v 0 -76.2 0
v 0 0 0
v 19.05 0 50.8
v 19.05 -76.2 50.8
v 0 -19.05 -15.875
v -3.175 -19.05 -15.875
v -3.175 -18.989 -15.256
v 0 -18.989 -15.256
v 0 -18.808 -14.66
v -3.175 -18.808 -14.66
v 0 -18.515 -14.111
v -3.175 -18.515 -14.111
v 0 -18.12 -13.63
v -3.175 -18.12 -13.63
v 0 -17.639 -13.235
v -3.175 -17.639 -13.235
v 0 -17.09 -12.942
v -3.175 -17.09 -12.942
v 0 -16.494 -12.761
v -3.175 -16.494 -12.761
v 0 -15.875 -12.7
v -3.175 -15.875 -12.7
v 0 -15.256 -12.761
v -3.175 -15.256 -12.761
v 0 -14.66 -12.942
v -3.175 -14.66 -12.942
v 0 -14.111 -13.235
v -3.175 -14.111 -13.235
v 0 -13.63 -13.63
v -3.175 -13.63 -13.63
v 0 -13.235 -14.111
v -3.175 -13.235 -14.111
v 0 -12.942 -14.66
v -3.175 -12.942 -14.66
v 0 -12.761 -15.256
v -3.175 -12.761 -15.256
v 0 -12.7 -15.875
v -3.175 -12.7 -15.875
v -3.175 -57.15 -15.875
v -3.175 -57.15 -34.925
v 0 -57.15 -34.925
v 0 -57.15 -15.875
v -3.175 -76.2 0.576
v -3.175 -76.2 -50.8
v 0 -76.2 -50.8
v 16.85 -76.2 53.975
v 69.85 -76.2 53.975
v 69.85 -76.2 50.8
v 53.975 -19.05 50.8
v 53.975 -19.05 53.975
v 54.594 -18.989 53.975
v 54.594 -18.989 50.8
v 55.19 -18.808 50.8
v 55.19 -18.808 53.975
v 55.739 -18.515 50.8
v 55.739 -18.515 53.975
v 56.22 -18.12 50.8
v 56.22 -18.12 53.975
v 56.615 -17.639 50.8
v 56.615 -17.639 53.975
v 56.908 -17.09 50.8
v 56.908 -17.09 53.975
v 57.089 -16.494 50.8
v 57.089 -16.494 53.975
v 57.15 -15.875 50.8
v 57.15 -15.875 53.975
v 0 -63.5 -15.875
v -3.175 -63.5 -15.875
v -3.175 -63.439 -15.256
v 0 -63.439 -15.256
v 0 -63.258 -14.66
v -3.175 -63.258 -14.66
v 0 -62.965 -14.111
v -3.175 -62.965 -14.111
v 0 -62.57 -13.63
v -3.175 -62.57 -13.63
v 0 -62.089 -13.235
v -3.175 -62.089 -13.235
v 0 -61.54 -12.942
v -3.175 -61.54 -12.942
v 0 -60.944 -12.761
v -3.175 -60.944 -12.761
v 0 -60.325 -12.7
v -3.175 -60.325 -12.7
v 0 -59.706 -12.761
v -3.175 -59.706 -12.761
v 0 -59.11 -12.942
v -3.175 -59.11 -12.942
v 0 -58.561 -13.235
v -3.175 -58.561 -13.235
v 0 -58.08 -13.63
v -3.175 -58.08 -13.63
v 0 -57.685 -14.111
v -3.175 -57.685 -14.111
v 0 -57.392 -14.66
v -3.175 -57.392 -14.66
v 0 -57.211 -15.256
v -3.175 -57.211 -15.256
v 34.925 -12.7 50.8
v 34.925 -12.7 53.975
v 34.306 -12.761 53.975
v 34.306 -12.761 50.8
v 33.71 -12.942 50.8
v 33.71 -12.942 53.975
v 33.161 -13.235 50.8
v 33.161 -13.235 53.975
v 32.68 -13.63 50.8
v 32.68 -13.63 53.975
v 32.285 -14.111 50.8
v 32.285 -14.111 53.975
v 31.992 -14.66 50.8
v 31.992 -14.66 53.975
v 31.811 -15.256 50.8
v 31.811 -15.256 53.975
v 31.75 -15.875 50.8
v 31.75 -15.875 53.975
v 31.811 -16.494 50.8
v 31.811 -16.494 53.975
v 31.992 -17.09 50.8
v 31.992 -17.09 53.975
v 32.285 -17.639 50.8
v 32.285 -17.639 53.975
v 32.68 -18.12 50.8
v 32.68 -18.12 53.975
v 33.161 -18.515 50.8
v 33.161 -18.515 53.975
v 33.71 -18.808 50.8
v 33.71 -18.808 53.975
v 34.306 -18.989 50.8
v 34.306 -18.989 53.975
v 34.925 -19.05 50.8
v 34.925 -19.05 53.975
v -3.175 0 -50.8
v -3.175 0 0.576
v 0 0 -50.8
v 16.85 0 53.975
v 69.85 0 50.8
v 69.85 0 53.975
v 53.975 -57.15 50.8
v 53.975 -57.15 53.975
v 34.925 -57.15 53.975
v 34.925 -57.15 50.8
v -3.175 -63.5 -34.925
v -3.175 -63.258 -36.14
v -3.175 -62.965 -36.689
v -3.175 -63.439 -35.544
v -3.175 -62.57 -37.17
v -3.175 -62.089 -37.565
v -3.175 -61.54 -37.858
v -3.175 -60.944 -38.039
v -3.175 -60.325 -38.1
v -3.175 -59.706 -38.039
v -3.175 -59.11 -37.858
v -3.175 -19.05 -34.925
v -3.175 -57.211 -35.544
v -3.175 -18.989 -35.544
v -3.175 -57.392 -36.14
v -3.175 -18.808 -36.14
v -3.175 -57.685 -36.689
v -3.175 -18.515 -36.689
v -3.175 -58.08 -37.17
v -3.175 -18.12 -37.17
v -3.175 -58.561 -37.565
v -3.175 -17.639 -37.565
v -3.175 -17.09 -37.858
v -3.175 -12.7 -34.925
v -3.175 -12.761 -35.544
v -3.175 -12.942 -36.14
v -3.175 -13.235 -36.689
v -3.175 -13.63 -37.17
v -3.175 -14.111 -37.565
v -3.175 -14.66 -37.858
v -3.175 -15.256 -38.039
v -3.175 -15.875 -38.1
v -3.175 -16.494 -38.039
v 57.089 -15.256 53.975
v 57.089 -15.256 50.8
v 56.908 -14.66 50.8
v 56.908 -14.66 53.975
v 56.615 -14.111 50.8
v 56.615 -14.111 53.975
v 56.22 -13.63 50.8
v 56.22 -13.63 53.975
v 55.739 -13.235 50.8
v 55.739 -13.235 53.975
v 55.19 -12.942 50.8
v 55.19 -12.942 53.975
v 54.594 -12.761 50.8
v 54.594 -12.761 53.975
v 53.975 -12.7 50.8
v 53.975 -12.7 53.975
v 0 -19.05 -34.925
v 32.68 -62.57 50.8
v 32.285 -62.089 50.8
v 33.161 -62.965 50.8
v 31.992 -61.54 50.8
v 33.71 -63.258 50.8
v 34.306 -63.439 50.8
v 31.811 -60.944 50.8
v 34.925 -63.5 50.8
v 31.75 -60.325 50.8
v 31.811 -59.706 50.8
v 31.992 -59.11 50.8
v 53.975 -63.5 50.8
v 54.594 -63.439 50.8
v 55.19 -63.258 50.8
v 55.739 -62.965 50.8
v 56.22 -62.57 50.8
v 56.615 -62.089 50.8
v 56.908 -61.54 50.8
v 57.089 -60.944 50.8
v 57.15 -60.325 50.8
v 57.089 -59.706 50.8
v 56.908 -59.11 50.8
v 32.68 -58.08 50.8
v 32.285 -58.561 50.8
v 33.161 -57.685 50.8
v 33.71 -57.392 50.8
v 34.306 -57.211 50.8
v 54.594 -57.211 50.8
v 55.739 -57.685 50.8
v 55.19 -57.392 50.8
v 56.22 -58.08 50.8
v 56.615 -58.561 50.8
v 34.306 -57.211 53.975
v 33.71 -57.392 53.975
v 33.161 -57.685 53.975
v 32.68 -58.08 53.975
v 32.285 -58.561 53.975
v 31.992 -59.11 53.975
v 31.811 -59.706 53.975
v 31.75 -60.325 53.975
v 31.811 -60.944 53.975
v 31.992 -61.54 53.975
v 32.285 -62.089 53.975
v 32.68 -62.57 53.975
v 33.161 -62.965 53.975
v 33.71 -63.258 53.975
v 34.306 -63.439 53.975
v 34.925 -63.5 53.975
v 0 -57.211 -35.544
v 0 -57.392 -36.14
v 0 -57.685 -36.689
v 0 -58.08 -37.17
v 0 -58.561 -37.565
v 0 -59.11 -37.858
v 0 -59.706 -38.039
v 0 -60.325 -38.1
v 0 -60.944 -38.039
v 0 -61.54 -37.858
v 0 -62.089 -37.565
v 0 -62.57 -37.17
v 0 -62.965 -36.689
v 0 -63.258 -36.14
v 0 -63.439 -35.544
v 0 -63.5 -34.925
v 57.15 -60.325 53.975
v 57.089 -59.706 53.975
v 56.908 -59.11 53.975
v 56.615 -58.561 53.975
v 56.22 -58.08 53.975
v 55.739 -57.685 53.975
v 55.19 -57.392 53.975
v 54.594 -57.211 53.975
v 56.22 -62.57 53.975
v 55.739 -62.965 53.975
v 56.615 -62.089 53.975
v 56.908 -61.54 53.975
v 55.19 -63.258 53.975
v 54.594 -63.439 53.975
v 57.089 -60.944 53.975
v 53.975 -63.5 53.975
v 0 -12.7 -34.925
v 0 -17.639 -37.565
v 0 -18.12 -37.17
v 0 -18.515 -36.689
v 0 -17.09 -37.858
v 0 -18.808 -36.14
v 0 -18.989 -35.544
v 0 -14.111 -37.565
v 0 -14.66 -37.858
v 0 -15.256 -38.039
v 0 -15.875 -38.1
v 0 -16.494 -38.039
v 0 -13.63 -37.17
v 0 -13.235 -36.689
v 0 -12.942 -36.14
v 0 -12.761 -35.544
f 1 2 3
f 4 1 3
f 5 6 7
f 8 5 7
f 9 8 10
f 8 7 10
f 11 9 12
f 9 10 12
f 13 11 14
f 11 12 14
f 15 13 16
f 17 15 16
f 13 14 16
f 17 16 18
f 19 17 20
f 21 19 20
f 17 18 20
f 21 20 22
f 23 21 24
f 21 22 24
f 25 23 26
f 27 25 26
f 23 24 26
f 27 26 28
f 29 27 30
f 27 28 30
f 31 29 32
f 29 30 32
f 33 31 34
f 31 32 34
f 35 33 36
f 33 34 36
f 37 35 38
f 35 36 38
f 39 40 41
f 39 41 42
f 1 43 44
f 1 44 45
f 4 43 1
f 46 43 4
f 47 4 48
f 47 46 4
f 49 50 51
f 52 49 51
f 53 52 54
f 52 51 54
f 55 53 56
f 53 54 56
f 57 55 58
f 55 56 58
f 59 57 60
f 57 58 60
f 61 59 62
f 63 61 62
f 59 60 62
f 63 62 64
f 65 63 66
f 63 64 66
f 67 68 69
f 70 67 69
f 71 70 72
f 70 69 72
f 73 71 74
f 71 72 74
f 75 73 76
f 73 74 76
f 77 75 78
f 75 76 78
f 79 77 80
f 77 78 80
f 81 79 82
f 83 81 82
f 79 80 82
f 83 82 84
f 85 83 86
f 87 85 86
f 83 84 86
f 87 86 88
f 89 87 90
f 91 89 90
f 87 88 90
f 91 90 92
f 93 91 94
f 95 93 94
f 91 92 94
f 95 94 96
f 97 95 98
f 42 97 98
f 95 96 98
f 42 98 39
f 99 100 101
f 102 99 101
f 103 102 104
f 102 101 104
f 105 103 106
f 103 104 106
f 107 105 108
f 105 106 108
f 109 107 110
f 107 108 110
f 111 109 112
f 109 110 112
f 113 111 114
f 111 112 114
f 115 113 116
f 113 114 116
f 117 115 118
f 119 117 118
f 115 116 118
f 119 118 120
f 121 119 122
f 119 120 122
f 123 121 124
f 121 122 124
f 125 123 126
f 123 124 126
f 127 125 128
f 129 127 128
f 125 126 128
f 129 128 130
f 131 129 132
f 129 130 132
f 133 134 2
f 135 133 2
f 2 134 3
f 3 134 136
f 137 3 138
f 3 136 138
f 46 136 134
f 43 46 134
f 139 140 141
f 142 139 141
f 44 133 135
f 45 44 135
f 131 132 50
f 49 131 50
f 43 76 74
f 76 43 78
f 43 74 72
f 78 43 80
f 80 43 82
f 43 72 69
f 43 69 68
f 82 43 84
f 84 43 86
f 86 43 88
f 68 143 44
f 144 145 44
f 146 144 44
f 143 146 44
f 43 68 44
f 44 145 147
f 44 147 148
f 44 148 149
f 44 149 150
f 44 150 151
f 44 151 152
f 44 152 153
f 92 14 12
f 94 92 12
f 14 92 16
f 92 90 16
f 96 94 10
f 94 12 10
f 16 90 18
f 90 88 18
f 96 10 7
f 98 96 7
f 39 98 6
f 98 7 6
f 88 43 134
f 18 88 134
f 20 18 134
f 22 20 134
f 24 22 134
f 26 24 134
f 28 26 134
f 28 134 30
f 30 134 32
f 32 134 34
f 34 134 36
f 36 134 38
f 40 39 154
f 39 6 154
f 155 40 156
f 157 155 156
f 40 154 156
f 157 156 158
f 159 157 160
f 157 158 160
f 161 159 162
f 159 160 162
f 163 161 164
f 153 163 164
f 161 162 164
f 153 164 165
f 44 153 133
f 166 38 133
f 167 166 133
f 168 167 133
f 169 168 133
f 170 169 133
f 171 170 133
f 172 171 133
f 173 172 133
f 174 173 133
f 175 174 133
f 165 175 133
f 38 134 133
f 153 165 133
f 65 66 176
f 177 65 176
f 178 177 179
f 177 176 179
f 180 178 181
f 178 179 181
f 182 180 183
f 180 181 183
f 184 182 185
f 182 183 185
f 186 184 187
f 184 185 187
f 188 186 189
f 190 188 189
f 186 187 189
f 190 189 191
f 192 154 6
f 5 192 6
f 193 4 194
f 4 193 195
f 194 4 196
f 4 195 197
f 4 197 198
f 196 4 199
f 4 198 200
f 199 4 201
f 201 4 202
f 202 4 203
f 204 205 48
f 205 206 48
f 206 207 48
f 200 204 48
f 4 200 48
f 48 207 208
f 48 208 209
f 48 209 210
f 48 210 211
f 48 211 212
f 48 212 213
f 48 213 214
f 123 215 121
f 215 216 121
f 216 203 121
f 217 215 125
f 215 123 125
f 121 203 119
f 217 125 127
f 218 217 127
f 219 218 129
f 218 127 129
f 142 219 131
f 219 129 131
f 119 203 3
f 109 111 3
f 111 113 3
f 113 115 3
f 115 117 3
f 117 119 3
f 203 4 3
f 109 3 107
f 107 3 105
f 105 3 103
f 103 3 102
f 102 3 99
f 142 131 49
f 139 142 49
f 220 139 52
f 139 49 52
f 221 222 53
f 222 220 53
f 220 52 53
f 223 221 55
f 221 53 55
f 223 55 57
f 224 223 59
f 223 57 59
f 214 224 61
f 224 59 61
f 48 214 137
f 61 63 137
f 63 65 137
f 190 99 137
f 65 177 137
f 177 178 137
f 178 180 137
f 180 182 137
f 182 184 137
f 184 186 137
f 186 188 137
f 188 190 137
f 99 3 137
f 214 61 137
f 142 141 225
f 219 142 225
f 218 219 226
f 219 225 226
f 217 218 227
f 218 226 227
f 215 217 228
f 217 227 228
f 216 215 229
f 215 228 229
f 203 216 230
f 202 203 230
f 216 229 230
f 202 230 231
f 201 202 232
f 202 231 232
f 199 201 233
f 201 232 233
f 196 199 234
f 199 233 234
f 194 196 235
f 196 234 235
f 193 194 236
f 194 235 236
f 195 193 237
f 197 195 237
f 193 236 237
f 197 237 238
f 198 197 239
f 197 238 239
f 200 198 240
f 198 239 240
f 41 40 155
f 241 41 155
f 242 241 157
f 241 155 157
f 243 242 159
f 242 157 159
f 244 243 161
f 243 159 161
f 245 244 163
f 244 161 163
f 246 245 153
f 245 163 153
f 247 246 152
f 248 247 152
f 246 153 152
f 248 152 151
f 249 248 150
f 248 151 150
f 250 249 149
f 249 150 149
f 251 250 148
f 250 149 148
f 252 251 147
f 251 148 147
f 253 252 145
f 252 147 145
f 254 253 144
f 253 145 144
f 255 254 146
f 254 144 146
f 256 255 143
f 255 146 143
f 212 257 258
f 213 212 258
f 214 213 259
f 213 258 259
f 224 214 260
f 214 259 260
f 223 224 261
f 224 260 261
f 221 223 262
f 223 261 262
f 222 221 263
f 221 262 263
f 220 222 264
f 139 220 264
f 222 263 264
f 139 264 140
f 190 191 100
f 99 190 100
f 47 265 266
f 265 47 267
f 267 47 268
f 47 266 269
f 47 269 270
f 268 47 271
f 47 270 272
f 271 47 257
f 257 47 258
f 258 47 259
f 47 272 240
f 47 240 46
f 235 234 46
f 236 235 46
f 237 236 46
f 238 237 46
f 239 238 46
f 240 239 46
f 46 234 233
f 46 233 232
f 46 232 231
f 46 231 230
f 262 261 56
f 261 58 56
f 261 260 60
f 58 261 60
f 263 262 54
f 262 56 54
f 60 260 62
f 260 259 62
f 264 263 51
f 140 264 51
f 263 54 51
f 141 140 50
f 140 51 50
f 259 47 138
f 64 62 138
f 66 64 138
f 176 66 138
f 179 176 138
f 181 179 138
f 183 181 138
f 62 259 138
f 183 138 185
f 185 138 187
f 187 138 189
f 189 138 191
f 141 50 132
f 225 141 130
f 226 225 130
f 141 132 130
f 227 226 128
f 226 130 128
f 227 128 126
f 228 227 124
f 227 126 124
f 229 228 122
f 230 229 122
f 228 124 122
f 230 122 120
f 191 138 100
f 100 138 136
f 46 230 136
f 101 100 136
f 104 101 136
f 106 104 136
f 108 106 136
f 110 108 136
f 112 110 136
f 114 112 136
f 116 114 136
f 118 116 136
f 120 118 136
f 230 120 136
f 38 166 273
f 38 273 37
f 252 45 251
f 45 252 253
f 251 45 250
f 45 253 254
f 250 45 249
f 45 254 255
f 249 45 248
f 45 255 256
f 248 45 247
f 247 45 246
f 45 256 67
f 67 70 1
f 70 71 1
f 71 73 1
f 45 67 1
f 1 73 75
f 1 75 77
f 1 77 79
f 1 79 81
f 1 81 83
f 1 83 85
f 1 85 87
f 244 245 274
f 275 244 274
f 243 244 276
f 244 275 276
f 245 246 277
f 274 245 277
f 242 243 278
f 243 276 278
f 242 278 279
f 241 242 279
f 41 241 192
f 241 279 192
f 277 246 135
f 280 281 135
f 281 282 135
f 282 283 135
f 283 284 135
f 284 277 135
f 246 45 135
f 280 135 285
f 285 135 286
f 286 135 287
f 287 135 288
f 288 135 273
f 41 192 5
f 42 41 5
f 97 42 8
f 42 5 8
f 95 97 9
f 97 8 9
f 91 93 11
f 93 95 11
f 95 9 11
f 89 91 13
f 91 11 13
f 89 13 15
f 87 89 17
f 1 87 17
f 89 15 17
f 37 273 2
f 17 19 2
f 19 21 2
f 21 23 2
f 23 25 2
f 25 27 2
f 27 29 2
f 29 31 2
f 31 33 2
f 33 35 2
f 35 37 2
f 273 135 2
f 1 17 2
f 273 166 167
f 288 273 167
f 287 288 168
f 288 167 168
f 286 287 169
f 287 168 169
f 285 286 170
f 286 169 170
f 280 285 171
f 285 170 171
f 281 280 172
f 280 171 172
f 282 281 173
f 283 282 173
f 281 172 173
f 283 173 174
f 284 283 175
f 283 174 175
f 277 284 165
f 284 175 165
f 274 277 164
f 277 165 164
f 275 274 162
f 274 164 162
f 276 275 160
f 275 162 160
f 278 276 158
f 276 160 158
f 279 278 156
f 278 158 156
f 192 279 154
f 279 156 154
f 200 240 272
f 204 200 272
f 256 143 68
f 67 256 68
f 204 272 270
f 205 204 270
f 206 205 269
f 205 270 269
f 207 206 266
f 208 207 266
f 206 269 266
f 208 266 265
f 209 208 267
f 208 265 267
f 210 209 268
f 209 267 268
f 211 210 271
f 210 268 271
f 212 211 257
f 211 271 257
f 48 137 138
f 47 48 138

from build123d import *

# Parameters (mm, degrees)
F1_DEPTH = 76.2
F3_DEPTH = 104.776
F4_DEPTH = 104.776
F5_W     = 6.35
F5_H     = 19.05
F6_DEPTH = 73.026
F7_W     = 6.35
F7_H     = 19.05
F8_DEPTH = 73.026


with BuildPart() as f1:
    # F0 (on Front) → F1 (new body)
    with BuildSketch(Plane.XZ):
        Polygon((0, -50.8), (0, 0), (19.05, 50.8), (69.85, 50.8), (69.85, 53.975), (16.849724, 53.975), (-3.175, 0.575737), (-3.175, -50.8), align=None)
    extrude(amount=F1_DEPTH)

    # F2 (on face) → F3 (cut, through all)
    with BuildSketch(Plane.XY.offset(53.975)):
        with BuildLine():
            ThreePointArc((53.975, -19.05), (56.220064, -18.120064), (57.15, -15.875))
            ThreePointArc((57.15, -15.875), (56.220064, -13.629936), (53.975, -12.7))
            ThreePointArc((53.975, -12.7), (50.8, -15.875), (53.975, -19.05))
        make_face()
        with BuildLine():
            ThreePointArc((53.975, -19.05), (50.8, -15.875), (53.975, -12.7))
            Line((53.975, -12.7), (34.925, -12.7))
            ThreePointArc((34.925, -12.7), (37.170064, -13.629936), (38.1, -15.875))
            ThreePointArc((38.1, -15.875), (37.170064, -18.120064), (34.925, -19.05))
            Line((34.925, -19.05), (53.975, -19.05))
        make_face()
        with BuildLine():
            ThreePointArc((38.1, -15.875), (37.170064, -13.629936), (34.925, -12.7))
            ThreePointArc((34.925, -12.7), (31.75, -15.875), (34.925, -19.05))
            ThreePointArc((34.925, -19.05), (37.170064, -18.120064), (38.1, -15.875))
        make_face()
    extrude(amount=-F3_DEPTH, mode=Mode.SUBTRACT)

    # F2 (on face) → F4 (cut, through all)
    with BuildSketch(Plane.XY.offset(53.975)):
        with BuildLine():
            ThreePointArc((38.1, -60.325), (37.170064, -58.079936), (34.925, -57.15))
            ThreePointArc((34.925, -57.15), (31.75, -60.325), (34.925, -63.5))
            ThreePointArc((34.925, -63.5), (37.170064, -62.570064), (38.1, -60.325))
        make_face()
        with BuildLine():
            ThreePointArc((53.975, -63.5), (56.220064, -62.570064), (57.15, -60.325))
            ThreePointArc((57.15, -60.325), (56.220064, -58.079936), (53.975, -57.15))
            ThreePointArc((53.975, -57.15), (50.8, -60.325), (53.975, -63.5))
        make_face()
        with BuildLine():
            ThreePointArc((53.975, -63.5), (50.8, -60.325), (53.975, -57.15))
            Line((53.975, -57.15), (34.925, -57.15))
            ThreePointArc((34.925, -57.15), (37.170064, -58.079936), (38.1, -60.325))
            ThreePointArc((38.1, -60.325), (37.170064, -62.570064), (34.925, -63.5))
            Line((34.925, -63.5), (53.975, -63.5))
        make_face()
    extrude(amount=-F4_DEPTH, mode=Mode.SUBTRACT)

    # F5 (on face) → F6 (cut, through all)
    with BuildSketch(Plane(origin=(-3.175, 0, 0), x_dir=(0, -1, 0), z_dir=(-1, 0, 0))):
        with BuildLine():
            Line((19.05, -34.925), (12.7, -34.925))
            ThreePointArc((12.7, -34.925), (15.875, -38.1), (19.05, -34.925))
        make_face()
        with BuildLine():
            ThreePointArc((19.05, -15.875), (15.875, -12.7), (12.7, -15.875))
            Line((12.7, -15.875), (19.05, -15.875))
        make_face()
        with Locations((15.875, -25.4)):
            Rectangle(F5_W, F5_H)
    extrude(amount=-F6_DEPTH, mode=Mode.SUBTRACT)

    # F7 (on face) → F8 (cut, through all)
    with BuildSketch(Plane(origin=(-3.175, 0, 0), x_dir=(0, -1, 0), z_dir=(-1, 0, 0))):
        with BuildLine():
            Line((57.15, -15.875), (63.5, -15.875))
            ThreePointArc((63.5, -15.875), (60.325, -12.7), (57.15, -15.875))
        make_face()
        with BuildLine():
            ThreePointArc((57.15, -34.925), (60.325, -38.1), (63.5, -34.925))
            Line((63.5, -34.925), (57.15, -34.925))
        make_face()
        with Locations((60.325, -25.4)):
            Rectangle(F7_W, F7_H)
    extrude(amount=-F8_DEPTH, mode=Mode.SUBTRACT)


solid = f1.part
